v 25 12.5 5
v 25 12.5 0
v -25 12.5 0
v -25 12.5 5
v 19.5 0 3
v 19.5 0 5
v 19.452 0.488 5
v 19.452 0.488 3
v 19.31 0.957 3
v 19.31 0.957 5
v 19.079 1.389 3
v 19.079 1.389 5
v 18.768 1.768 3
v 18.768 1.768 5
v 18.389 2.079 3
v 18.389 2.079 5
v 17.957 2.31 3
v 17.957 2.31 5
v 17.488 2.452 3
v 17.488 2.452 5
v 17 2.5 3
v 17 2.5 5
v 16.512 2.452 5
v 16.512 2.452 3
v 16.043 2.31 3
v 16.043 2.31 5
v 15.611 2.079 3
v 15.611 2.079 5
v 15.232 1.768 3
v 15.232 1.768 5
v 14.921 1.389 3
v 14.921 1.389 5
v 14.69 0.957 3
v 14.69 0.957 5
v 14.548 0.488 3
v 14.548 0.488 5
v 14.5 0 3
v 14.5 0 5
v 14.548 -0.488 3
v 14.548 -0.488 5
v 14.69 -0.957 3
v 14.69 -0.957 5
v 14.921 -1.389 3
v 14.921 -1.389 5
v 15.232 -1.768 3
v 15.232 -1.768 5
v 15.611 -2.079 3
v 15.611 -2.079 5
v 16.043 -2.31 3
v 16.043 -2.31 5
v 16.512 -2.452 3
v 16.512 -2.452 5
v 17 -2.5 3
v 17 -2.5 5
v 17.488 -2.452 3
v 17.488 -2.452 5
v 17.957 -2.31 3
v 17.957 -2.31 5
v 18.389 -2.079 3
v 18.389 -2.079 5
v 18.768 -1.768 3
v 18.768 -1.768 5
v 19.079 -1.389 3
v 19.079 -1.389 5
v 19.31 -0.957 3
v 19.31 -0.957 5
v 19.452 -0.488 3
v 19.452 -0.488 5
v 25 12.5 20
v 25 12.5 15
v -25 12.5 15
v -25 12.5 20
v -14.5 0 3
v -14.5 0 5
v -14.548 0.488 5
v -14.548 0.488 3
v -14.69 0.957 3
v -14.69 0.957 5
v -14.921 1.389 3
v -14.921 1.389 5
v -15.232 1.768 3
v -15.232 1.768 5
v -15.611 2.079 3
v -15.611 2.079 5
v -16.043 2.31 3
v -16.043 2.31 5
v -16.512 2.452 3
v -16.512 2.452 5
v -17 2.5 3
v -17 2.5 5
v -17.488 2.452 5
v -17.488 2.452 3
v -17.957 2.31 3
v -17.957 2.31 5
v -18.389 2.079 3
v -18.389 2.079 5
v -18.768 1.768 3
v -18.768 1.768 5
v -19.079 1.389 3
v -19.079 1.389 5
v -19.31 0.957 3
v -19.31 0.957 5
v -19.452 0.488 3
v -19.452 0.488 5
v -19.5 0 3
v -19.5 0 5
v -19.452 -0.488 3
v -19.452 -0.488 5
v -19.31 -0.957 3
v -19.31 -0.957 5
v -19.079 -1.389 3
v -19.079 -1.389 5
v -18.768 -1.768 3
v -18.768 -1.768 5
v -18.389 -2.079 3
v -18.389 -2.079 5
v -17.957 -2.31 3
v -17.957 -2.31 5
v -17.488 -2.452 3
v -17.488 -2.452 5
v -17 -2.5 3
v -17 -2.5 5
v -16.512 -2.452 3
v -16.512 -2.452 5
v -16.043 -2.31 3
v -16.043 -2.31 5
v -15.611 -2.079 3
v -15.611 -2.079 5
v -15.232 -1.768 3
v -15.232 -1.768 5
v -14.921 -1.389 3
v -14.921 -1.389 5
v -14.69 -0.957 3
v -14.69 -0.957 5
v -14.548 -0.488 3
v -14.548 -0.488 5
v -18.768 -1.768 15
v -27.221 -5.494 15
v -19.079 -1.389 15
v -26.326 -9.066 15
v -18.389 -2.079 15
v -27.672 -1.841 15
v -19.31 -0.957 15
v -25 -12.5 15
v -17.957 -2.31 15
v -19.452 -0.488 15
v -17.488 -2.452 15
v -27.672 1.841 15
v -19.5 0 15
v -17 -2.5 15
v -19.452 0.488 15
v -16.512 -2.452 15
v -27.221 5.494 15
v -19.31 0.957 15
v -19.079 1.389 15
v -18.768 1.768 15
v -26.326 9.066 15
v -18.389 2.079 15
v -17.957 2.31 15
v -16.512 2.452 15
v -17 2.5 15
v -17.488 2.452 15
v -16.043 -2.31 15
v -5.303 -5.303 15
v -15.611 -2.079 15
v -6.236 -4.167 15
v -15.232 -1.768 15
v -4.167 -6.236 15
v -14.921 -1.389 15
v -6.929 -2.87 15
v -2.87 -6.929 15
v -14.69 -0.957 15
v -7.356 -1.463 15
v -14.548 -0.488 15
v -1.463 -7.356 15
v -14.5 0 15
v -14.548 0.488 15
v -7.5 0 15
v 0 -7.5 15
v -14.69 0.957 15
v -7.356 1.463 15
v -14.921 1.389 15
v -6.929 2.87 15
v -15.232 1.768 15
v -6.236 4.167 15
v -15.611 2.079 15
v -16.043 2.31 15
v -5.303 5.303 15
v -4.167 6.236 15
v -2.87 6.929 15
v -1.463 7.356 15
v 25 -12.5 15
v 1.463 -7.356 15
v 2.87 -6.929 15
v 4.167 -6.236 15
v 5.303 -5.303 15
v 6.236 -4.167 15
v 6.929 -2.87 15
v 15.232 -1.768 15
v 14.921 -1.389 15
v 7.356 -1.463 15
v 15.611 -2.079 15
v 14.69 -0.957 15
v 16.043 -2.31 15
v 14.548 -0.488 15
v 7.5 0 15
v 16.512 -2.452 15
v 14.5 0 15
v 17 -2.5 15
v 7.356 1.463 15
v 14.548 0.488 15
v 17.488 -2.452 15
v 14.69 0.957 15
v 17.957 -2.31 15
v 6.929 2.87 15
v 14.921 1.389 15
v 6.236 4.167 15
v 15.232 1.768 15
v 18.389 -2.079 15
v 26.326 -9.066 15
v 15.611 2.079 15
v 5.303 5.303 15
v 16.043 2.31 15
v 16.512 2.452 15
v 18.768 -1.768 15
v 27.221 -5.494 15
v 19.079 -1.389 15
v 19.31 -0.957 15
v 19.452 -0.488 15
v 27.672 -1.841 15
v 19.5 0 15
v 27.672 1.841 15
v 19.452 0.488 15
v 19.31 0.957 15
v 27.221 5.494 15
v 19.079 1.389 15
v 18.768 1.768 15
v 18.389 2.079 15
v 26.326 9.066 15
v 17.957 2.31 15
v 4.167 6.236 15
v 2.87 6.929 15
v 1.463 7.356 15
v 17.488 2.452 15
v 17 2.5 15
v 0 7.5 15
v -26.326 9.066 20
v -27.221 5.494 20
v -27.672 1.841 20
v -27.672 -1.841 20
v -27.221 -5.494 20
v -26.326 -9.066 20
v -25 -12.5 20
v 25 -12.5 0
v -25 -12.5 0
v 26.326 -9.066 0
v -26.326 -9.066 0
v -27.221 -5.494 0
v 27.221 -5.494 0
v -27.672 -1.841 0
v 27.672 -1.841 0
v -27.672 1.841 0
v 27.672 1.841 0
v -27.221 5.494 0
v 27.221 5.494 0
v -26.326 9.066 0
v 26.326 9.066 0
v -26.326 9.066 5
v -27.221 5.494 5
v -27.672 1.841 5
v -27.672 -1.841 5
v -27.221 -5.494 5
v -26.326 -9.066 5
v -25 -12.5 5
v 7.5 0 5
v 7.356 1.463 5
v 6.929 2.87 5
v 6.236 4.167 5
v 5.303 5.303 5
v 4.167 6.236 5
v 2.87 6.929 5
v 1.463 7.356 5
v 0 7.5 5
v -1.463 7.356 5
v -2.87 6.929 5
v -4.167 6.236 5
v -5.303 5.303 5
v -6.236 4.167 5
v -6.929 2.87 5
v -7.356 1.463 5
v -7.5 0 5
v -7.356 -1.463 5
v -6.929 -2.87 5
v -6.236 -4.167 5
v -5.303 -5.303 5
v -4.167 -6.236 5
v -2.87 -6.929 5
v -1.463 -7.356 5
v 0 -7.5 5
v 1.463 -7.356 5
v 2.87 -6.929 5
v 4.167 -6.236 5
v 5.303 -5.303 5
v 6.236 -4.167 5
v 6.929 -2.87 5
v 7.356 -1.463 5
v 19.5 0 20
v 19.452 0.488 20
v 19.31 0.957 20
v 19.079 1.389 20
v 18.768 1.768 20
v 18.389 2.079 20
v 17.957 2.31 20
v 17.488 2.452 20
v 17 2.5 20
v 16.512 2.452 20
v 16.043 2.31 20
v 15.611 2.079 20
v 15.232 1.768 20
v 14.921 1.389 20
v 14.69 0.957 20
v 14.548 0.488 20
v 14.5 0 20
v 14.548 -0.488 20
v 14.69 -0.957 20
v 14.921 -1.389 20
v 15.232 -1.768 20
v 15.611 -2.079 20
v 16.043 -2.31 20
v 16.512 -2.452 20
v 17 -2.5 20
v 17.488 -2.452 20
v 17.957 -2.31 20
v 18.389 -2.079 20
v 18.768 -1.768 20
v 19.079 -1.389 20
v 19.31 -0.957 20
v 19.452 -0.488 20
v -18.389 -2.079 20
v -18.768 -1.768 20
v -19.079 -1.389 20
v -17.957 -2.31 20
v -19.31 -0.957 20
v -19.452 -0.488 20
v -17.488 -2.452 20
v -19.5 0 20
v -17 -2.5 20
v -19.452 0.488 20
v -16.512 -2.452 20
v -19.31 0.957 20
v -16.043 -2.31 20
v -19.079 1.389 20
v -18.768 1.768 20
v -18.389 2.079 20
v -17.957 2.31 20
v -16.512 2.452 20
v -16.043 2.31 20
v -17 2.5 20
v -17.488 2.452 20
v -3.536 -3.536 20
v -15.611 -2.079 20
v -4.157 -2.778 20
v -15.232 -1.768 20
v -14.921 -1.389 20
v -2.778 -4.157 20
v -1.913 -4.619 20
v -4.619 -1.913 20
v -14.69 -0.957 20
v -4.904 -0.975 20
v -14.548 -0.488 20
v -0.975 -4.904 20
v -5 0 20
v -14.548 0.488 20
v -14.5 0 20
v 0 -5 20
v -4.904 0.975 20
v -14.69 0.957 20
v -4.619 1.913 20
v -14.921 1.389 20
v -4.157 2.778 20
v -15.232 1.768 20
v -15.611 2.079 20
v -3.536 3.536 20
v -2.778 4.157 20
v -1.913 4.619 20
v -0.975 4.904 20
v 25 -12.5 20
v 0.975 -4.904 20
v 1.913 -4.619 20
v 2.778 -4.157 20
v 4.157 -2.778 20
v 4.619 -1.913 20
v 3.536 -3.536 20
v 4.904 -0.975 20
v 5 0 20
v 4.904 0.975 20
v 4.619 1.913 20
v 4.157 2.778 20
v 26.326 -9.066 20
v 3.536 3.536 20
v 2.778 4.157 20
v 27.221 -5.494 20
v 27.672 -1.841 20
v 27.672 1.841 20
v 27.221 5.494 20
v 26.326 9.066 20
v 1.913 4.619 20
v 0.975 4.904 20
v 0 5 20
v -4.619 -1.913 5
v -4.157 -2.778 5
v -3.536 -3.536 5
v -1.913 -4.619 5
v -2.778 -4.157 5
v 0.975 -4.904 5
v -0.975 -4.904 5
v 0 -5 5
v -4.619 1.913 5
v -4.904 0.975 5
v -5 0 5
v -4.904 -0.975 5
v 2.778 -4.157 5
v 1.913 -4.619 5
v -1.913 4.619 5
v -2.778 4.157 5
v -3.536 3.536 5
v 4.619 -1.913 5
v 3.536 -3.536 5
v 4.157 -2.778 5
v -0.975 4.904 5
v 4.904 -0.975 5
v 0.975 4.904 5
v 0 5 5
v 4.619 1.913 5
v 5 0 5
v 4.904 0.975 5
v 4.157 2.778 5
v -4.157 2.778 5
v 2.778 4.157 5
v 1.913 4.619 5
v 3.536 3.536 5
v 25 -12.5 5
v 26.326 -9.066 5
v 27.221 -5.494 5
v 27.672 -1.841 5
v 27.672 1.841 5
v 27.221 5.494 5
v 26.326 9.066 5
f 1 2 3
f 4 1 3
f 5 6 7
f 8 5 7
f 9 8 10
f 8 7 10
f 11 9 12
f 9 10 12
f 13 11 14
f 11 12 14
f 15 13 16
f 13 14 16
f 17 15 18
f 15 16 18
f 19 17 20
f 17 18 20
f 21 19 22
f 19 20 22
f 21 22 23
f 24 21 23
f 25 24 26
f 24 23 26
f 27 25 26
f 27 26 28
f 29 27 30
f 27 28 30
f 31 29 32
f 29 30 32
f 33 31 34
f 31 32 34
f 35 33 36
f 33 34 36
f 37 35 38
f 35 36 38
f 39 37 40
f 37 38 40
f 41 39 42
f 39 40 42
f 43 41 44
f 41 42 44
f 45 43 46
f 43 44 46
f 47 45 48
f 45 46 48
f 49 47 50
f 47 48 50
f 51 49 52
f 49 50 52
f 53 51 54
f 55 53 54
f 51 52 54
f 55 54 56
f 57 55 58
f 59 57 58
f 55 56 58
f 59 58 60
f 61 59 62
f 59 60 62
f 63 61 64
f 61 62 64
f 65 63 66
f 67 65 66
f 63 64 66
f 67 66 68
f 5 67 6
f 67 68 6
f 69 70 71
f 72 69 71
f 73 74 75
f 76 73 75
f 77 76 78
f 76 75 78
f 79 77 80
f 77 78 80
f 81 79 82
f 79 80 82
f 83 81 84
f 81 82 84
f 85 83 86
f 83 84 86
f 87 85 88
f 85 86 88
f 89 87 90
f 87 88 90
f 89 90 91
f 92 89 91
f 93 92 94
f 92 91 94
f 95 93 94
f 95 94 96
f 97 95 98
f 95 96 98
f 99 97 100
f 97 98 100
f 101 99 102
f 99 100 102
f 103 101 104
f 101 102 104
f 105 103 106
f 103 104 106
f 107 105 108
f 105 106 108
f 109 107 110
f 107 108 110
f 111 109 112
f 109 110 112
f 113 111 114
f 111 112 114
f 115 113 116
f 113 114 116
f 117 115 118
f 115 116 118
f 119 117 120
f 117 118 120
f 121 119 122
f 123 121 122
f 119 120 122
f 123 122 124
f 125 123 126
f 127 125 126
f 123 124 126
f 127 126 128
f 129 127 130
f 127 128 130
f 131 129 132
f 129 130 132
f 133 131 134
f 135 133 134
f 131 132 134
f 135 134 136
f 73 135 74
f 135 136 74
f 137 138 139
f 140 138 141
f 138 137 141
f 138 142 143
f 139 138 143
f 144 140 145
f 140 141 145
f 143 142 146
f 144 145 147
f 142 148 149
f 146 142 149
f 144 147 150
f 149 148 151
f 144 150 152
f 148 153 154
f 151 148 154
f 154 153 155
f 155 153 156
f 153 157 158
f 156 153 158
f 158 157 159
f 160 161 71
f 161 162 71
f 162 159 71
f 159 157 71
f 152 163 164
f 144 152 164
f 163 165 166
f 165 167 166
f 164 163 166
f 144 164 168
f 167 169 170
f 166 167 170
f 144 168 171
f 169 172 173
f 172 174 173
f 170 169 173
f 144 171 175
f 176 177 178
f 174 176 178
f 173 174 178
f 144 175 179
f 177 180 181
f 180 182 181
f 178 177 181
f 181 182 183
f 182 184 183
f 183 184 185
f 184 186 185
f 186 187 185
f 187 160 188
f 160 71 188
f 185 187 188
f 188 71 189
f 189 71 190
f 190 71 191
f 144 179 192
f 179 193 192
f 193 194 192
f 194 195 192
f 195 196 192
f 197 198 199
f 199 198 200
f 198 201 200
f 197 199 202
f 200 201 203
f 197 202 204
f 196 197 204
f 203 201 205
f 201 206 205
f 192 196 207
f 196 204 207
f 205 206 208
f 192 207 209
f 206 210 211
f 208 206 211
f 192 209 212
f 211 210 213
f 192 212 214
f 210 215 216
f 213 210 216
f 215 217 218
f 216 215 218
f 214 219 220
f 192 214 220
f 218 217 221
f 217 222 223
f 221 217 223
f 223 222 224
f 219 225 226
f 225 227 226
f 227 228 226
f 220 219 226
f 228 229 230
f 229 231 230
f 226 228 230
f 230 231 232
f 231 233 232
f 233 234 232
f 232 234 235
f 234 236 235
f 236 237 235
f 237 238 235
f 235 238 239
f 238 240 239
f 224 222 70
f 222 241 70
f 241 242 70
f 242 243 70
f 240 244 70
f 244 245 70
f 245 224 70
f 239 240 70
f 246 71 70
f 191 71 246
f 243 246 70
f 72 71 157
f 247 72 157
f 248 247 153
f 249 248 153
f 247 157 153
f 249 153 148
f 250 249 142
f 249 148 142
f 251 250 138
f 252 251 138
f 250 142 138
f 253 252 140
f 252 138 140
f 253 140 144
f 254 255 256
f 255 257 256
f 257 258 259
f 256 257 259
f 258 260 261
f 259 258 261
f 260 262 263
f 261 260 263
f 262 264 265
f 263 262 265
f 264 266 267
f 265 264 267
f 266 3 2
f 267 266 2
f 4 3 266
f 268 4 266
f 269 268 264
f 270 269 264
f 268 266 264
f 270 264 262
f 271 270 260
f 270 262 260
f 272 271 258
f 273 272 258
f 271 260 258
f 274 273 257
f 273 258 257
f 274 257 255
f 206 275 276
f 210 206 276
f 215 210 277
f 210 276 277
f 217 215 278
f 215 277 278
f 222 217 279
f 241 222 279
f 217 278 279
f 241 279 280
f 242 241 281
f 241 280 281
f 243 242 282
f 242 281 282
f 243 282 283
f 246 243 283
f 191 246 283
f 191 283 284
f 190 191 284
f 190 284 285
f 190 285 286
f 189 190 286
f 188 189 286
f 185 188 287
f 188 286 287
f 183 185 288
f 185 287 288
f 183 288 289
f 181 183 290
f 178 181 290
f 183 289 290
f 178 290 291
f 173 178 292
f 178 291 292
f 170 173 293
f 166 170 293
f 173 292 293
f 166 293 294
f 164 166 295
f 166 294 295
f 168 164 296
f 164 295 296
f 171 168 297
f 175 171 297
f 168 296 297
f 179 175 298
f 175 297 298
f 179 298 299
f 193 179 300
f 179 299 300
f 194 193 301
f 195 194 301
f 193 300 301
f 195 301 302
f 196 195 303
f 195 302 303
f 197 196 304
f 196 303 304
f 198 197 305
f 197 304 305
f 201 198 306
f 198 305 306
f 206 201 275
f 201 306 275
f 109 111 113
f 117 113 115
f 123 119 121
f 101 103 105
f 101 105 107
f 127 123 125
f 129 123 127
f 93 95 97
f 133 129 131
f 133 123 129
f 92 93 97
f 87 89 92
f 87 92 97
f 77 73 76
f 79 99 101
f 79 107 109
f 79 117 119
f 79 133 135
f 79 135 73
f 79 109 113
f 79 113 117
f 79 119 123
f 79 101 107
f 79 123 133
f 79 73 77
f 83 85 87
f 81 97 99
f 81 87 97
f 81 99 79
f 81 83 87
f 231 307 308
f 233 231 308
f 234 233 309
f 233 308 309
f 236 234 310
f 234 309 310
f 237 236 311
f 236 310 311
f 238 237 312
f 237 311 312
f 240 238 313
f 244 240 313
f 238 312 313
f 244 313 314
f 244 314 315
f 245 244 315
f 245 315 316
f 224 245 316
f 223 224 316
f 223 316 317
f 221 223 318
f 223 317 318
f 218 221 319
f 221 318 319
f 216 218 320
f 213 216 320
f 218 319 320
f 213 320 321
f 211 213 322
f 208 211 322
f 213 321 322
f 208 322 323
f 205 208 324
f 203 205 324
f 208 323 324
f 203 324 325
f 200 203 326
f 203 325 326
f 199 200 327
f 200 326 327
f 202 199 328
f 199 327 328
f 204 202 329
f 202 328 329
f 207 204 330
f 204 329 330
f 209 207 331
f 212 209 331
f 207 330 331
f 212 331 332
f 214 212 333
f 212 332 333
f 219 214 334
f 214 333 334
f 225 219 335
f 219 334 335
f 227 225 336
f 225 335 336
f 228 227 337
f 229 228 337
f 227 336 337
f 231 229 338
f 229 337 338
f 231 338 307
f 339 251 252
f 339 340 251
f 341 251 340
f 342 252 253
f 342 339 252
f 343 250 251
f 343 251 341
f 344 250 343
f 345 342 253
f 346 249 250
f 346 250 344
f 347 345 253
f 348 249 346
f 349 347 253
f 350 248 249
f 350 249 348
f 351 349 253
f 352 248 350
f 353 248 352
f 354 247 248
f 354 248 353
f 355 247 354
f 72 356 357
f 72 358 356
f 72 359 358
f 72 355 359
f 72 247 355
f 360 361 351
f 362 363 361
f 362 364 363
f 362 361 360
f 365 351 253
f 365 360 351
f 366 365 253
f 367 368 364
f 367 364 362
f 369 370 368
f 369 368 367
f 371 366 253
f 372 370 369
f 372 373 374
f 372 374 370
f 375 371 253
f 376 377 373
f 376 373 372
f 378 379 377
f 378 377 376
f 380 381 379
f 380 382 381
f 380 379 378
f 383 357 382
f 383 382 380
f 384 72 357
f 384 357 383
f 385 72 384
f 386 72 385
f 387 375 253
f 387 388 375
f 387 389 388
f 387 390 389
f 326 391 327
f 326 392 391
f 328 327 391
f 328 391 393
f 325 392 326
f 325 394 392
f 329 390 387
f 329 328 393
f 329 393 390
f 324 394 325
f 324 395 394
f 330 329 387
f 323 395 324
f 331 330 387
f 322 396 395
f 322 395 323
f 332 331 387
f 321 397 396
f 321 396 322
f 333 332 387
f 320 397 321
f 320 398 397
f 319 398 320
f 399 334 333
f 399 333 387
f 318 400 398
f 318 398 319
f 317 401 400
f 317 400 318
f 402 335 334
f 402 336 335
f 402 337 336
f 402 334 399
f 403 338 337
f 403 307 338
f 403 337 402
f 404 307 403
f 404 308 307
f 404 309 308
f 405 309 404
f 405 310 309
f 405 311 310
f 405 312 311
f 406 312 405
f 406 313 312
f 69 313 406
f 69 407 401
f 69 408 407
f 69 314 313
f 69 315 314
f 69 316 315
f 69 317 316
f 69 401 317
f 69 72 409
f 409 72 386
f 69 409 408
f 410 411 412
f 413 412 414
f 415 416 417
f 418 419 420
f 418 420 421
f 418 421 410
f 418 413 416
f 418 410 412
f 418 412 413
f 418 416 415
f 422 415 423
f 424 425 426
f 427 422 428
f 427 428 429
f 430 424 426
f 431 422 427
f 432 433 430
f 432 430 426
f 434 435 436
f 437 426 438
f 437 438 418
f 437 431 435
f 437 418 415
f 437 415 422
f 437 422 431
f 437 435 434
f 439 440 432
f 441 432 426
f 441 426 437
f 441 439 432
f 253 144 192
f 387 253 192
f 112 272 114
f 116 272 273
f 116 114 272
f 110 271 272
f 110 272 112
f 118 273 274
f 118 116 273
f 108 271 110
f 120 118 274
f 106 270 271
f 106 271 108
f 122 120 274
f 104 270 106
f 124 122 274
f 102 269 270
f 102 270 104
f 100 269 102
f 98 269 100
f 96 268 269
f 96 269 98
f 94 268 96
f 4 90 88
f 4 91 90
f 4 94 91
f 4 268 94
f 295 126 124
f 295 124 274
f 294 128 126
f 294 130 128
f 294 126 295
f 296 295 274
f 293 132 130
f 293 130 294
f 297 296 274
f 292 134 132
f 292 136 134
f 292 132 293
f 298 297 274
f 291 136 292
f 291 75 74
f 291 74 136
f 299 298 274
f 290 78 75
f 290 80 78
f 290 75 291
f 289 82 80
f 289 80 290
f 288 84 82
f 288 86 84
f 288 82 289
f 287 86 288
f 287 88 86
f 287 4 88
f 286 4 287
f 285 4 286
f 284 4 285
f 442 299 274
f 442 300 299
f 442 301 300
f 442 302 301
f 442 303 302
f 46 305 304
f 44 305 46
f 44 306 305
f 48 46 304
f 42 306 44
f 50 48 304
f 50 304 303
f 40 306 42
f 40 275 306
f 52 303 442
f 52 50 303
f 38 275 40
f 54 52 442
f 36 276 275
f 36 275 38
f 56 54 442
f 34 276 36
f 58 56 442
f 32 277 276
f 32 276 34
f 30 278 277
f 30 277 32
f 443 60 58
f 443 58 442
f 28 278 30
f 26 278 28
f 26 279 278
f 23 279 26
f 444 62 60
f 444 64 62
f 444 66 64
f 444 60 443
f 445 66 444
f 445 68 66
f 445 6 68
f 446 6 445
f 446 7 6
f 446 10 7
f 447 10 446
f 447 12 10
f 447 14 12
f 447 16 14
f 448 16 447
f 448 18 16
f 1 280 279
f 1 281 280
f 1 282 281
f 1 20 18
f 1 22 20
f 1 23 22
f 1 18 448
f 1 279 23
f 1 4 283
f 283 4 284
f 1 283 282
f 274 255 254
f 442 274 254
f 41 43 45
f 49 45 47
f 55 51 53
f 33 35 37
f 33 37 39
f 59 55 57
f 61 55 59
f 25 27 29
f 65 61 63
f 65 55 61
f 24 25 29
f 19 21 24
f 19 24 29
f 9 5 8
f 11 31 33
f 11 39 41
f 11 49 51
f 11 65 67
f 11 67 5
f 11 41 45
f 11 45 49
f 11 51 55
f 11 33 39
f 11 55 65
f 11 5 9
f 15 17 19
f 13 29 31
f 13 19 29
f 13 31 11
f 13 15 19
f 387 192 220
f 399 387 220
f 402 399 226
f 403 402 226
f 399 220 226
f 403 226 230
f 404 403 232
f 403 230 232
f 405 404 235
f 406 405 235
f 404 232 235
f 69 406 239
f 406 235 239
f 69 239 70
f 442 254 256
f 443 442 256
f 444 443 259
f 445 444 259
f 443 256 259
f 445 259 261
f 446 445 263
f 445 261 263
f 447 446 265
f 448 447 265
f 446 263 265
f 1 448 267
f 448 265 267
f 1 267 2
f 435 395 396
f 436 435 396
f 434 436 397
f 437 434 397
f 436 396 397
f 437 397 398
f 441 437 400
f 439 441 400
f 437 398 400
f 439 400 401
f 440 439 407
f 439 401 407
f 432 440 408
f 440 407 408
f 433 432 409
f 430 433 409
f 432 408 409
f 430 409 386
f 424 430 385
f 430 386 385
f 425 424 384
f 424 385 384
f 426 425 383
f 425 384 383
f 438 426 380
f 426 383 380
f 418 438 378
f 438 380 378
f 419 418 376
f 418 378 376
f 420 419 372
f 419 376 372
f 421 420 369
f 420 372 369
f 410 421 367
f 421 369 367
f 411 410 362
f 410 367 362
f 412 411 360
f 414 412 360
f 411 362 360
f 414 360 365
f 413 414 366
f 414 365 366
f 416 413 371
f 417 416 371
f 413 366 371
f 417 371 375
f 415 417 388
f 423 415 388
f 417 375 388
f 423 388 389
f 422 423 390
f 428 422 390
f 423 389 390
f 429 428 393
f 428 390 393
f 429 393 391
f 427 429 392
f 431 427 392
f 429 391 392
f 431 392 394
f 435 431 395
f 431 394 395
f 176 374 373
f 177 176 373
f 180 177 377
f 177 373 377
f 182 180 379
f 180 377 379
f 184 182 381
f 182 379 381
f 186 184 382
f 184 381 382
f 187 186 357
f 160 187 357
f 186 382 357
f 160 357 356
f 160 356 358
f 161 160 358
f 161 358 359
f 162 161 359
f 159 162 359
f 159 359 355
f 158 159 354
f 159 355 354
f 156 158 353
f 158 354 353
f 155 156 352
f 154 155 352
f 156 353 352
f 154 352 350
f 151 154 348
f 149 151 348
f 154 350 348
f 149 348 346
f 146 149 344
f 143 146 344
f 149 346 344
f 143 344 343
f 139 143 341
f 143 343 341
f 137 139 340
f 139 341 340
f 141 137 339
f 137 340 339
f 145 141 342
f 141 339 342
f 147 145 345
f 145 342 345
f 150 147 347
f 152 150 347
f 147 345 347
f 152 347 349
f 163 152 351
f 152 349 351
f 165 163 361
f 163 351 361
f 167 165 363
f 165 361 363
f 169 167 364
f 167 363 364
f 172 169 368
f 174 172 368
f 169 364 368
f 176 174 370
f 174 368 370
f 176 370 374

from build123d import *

# Parameters (mm, degrees)
BOSS_EXTRUDE1_DEPTH = 5
SKETCH2_R           = 7.5
BOSS_EXTRUDE2_DEPTH = 10
SKETCH3_R           = 2.5
CUT_EXTRUDE1_DEPTH  = 2
SKETCH4_R           = 7.5
BOSS_EXTRUDE3_DEPTH = 5
SKETCH6_R           = 7.5
BOSS_EXTRUDE4_DEPTH = 5
SKETCH7_R           = 5
CUT_EXTRUDE2_DEPTH  = 15
SKETCH8_R           = 2.5
CUT_EXTRUDE3_DEPTH  = 5


with BuildPart() as part:
    # Sketch1 → Boss-Extrude1 (new body)
    with BuildSketch(Plane.XY):
        with BuildLine():
            Line((-25, -12.5), (25, -12.5))
            ThreePointArc((25, -12.5), (27.728219713, 0), (25, 12.5))
            Line((25, 12.5), (-25, 12.5))
            ThreePointArc((-25, 12.5), (-27.728219713, 0), (-25, -12.5))
        make_face()
    extrude(amount=BOSS_EXTRUDE1_DEPTH)

    # Sketch2 → Boss-Extrude2 (add)
    with BuildSketch(Plane.XY.offset(5)):
        Circle(SKETCH2_R)
    extrude(amount=BOSS_EXTRUDE2_DEPTH)

    # Sketch3 → Cut-Extrude1 (cut)
    with BuildSketch(Plane.XY.offset(5)):
        with Locations((17, 0)):
            Circle(SKETCH3_R)
        with Locations((-17, 0)):
            Circle(SKETCH3_R)
    extrude(amount=-CUT_EXTRUDE1_DEPTH, mode=Mode.SUBTRACT)



with BuildPart() as body_2:
    # Sketch4 → Boss-Extrude3 (new body)
    with BuildSketch(Plane.XY.offset(15)):
        with BuildLine():
            Line((25, 12.5), (-25, 12.5))
            ThreePointArc((-25, 12.5), (-27.728219713, 0), (-25, -12.5))
            Line((-25, -12.5), (25, -12.5))
            ThreePointArc((25, -12.5), (27.728219713, 0), (25, 12.5))
        make_face()
        Circle(SKETCH4_R, mode=Mode.SUBTRACT)
    extrude(amount=BOSS_EXTRUDE3_DEPTH)


with BuildPart() as part_1:
    add(part.part)

    add(body_2.part)  # Boss-Extrude4 merges body 2
    # Sketch6 → Boss-Extrude4 (add)
    with BuildSketch(Plane.XY.offset(15)):
        Circle(SKETCH6_R)
    extrude(amount=BOSS_EXTRUDE4_DEPTH)

    # Sketch7 → Cut-Extrude2 (cut)
    with BuildSketch(Plane.XY.offset(20)):
        Circle(SKETCH7_R)
    extrude(amount=-CUT_EXTRUDE2_DEPTH, mode=Mode.SUBTRACT)

    # Sketch8 → Cut-Extrude3 (cut)
    with BuildSketch(Plane.XY.offset(20)):
        with Locations((17, 0)):
            Circle(SKETCH8_R)
        with Locations((-17, 0)):
            Circle(SKETCH8_R)
    extrude(amount=-CUT_EXTRUDE3_DEPTH, mode=Mode.SUBTRACT)


solid = part_1.part
